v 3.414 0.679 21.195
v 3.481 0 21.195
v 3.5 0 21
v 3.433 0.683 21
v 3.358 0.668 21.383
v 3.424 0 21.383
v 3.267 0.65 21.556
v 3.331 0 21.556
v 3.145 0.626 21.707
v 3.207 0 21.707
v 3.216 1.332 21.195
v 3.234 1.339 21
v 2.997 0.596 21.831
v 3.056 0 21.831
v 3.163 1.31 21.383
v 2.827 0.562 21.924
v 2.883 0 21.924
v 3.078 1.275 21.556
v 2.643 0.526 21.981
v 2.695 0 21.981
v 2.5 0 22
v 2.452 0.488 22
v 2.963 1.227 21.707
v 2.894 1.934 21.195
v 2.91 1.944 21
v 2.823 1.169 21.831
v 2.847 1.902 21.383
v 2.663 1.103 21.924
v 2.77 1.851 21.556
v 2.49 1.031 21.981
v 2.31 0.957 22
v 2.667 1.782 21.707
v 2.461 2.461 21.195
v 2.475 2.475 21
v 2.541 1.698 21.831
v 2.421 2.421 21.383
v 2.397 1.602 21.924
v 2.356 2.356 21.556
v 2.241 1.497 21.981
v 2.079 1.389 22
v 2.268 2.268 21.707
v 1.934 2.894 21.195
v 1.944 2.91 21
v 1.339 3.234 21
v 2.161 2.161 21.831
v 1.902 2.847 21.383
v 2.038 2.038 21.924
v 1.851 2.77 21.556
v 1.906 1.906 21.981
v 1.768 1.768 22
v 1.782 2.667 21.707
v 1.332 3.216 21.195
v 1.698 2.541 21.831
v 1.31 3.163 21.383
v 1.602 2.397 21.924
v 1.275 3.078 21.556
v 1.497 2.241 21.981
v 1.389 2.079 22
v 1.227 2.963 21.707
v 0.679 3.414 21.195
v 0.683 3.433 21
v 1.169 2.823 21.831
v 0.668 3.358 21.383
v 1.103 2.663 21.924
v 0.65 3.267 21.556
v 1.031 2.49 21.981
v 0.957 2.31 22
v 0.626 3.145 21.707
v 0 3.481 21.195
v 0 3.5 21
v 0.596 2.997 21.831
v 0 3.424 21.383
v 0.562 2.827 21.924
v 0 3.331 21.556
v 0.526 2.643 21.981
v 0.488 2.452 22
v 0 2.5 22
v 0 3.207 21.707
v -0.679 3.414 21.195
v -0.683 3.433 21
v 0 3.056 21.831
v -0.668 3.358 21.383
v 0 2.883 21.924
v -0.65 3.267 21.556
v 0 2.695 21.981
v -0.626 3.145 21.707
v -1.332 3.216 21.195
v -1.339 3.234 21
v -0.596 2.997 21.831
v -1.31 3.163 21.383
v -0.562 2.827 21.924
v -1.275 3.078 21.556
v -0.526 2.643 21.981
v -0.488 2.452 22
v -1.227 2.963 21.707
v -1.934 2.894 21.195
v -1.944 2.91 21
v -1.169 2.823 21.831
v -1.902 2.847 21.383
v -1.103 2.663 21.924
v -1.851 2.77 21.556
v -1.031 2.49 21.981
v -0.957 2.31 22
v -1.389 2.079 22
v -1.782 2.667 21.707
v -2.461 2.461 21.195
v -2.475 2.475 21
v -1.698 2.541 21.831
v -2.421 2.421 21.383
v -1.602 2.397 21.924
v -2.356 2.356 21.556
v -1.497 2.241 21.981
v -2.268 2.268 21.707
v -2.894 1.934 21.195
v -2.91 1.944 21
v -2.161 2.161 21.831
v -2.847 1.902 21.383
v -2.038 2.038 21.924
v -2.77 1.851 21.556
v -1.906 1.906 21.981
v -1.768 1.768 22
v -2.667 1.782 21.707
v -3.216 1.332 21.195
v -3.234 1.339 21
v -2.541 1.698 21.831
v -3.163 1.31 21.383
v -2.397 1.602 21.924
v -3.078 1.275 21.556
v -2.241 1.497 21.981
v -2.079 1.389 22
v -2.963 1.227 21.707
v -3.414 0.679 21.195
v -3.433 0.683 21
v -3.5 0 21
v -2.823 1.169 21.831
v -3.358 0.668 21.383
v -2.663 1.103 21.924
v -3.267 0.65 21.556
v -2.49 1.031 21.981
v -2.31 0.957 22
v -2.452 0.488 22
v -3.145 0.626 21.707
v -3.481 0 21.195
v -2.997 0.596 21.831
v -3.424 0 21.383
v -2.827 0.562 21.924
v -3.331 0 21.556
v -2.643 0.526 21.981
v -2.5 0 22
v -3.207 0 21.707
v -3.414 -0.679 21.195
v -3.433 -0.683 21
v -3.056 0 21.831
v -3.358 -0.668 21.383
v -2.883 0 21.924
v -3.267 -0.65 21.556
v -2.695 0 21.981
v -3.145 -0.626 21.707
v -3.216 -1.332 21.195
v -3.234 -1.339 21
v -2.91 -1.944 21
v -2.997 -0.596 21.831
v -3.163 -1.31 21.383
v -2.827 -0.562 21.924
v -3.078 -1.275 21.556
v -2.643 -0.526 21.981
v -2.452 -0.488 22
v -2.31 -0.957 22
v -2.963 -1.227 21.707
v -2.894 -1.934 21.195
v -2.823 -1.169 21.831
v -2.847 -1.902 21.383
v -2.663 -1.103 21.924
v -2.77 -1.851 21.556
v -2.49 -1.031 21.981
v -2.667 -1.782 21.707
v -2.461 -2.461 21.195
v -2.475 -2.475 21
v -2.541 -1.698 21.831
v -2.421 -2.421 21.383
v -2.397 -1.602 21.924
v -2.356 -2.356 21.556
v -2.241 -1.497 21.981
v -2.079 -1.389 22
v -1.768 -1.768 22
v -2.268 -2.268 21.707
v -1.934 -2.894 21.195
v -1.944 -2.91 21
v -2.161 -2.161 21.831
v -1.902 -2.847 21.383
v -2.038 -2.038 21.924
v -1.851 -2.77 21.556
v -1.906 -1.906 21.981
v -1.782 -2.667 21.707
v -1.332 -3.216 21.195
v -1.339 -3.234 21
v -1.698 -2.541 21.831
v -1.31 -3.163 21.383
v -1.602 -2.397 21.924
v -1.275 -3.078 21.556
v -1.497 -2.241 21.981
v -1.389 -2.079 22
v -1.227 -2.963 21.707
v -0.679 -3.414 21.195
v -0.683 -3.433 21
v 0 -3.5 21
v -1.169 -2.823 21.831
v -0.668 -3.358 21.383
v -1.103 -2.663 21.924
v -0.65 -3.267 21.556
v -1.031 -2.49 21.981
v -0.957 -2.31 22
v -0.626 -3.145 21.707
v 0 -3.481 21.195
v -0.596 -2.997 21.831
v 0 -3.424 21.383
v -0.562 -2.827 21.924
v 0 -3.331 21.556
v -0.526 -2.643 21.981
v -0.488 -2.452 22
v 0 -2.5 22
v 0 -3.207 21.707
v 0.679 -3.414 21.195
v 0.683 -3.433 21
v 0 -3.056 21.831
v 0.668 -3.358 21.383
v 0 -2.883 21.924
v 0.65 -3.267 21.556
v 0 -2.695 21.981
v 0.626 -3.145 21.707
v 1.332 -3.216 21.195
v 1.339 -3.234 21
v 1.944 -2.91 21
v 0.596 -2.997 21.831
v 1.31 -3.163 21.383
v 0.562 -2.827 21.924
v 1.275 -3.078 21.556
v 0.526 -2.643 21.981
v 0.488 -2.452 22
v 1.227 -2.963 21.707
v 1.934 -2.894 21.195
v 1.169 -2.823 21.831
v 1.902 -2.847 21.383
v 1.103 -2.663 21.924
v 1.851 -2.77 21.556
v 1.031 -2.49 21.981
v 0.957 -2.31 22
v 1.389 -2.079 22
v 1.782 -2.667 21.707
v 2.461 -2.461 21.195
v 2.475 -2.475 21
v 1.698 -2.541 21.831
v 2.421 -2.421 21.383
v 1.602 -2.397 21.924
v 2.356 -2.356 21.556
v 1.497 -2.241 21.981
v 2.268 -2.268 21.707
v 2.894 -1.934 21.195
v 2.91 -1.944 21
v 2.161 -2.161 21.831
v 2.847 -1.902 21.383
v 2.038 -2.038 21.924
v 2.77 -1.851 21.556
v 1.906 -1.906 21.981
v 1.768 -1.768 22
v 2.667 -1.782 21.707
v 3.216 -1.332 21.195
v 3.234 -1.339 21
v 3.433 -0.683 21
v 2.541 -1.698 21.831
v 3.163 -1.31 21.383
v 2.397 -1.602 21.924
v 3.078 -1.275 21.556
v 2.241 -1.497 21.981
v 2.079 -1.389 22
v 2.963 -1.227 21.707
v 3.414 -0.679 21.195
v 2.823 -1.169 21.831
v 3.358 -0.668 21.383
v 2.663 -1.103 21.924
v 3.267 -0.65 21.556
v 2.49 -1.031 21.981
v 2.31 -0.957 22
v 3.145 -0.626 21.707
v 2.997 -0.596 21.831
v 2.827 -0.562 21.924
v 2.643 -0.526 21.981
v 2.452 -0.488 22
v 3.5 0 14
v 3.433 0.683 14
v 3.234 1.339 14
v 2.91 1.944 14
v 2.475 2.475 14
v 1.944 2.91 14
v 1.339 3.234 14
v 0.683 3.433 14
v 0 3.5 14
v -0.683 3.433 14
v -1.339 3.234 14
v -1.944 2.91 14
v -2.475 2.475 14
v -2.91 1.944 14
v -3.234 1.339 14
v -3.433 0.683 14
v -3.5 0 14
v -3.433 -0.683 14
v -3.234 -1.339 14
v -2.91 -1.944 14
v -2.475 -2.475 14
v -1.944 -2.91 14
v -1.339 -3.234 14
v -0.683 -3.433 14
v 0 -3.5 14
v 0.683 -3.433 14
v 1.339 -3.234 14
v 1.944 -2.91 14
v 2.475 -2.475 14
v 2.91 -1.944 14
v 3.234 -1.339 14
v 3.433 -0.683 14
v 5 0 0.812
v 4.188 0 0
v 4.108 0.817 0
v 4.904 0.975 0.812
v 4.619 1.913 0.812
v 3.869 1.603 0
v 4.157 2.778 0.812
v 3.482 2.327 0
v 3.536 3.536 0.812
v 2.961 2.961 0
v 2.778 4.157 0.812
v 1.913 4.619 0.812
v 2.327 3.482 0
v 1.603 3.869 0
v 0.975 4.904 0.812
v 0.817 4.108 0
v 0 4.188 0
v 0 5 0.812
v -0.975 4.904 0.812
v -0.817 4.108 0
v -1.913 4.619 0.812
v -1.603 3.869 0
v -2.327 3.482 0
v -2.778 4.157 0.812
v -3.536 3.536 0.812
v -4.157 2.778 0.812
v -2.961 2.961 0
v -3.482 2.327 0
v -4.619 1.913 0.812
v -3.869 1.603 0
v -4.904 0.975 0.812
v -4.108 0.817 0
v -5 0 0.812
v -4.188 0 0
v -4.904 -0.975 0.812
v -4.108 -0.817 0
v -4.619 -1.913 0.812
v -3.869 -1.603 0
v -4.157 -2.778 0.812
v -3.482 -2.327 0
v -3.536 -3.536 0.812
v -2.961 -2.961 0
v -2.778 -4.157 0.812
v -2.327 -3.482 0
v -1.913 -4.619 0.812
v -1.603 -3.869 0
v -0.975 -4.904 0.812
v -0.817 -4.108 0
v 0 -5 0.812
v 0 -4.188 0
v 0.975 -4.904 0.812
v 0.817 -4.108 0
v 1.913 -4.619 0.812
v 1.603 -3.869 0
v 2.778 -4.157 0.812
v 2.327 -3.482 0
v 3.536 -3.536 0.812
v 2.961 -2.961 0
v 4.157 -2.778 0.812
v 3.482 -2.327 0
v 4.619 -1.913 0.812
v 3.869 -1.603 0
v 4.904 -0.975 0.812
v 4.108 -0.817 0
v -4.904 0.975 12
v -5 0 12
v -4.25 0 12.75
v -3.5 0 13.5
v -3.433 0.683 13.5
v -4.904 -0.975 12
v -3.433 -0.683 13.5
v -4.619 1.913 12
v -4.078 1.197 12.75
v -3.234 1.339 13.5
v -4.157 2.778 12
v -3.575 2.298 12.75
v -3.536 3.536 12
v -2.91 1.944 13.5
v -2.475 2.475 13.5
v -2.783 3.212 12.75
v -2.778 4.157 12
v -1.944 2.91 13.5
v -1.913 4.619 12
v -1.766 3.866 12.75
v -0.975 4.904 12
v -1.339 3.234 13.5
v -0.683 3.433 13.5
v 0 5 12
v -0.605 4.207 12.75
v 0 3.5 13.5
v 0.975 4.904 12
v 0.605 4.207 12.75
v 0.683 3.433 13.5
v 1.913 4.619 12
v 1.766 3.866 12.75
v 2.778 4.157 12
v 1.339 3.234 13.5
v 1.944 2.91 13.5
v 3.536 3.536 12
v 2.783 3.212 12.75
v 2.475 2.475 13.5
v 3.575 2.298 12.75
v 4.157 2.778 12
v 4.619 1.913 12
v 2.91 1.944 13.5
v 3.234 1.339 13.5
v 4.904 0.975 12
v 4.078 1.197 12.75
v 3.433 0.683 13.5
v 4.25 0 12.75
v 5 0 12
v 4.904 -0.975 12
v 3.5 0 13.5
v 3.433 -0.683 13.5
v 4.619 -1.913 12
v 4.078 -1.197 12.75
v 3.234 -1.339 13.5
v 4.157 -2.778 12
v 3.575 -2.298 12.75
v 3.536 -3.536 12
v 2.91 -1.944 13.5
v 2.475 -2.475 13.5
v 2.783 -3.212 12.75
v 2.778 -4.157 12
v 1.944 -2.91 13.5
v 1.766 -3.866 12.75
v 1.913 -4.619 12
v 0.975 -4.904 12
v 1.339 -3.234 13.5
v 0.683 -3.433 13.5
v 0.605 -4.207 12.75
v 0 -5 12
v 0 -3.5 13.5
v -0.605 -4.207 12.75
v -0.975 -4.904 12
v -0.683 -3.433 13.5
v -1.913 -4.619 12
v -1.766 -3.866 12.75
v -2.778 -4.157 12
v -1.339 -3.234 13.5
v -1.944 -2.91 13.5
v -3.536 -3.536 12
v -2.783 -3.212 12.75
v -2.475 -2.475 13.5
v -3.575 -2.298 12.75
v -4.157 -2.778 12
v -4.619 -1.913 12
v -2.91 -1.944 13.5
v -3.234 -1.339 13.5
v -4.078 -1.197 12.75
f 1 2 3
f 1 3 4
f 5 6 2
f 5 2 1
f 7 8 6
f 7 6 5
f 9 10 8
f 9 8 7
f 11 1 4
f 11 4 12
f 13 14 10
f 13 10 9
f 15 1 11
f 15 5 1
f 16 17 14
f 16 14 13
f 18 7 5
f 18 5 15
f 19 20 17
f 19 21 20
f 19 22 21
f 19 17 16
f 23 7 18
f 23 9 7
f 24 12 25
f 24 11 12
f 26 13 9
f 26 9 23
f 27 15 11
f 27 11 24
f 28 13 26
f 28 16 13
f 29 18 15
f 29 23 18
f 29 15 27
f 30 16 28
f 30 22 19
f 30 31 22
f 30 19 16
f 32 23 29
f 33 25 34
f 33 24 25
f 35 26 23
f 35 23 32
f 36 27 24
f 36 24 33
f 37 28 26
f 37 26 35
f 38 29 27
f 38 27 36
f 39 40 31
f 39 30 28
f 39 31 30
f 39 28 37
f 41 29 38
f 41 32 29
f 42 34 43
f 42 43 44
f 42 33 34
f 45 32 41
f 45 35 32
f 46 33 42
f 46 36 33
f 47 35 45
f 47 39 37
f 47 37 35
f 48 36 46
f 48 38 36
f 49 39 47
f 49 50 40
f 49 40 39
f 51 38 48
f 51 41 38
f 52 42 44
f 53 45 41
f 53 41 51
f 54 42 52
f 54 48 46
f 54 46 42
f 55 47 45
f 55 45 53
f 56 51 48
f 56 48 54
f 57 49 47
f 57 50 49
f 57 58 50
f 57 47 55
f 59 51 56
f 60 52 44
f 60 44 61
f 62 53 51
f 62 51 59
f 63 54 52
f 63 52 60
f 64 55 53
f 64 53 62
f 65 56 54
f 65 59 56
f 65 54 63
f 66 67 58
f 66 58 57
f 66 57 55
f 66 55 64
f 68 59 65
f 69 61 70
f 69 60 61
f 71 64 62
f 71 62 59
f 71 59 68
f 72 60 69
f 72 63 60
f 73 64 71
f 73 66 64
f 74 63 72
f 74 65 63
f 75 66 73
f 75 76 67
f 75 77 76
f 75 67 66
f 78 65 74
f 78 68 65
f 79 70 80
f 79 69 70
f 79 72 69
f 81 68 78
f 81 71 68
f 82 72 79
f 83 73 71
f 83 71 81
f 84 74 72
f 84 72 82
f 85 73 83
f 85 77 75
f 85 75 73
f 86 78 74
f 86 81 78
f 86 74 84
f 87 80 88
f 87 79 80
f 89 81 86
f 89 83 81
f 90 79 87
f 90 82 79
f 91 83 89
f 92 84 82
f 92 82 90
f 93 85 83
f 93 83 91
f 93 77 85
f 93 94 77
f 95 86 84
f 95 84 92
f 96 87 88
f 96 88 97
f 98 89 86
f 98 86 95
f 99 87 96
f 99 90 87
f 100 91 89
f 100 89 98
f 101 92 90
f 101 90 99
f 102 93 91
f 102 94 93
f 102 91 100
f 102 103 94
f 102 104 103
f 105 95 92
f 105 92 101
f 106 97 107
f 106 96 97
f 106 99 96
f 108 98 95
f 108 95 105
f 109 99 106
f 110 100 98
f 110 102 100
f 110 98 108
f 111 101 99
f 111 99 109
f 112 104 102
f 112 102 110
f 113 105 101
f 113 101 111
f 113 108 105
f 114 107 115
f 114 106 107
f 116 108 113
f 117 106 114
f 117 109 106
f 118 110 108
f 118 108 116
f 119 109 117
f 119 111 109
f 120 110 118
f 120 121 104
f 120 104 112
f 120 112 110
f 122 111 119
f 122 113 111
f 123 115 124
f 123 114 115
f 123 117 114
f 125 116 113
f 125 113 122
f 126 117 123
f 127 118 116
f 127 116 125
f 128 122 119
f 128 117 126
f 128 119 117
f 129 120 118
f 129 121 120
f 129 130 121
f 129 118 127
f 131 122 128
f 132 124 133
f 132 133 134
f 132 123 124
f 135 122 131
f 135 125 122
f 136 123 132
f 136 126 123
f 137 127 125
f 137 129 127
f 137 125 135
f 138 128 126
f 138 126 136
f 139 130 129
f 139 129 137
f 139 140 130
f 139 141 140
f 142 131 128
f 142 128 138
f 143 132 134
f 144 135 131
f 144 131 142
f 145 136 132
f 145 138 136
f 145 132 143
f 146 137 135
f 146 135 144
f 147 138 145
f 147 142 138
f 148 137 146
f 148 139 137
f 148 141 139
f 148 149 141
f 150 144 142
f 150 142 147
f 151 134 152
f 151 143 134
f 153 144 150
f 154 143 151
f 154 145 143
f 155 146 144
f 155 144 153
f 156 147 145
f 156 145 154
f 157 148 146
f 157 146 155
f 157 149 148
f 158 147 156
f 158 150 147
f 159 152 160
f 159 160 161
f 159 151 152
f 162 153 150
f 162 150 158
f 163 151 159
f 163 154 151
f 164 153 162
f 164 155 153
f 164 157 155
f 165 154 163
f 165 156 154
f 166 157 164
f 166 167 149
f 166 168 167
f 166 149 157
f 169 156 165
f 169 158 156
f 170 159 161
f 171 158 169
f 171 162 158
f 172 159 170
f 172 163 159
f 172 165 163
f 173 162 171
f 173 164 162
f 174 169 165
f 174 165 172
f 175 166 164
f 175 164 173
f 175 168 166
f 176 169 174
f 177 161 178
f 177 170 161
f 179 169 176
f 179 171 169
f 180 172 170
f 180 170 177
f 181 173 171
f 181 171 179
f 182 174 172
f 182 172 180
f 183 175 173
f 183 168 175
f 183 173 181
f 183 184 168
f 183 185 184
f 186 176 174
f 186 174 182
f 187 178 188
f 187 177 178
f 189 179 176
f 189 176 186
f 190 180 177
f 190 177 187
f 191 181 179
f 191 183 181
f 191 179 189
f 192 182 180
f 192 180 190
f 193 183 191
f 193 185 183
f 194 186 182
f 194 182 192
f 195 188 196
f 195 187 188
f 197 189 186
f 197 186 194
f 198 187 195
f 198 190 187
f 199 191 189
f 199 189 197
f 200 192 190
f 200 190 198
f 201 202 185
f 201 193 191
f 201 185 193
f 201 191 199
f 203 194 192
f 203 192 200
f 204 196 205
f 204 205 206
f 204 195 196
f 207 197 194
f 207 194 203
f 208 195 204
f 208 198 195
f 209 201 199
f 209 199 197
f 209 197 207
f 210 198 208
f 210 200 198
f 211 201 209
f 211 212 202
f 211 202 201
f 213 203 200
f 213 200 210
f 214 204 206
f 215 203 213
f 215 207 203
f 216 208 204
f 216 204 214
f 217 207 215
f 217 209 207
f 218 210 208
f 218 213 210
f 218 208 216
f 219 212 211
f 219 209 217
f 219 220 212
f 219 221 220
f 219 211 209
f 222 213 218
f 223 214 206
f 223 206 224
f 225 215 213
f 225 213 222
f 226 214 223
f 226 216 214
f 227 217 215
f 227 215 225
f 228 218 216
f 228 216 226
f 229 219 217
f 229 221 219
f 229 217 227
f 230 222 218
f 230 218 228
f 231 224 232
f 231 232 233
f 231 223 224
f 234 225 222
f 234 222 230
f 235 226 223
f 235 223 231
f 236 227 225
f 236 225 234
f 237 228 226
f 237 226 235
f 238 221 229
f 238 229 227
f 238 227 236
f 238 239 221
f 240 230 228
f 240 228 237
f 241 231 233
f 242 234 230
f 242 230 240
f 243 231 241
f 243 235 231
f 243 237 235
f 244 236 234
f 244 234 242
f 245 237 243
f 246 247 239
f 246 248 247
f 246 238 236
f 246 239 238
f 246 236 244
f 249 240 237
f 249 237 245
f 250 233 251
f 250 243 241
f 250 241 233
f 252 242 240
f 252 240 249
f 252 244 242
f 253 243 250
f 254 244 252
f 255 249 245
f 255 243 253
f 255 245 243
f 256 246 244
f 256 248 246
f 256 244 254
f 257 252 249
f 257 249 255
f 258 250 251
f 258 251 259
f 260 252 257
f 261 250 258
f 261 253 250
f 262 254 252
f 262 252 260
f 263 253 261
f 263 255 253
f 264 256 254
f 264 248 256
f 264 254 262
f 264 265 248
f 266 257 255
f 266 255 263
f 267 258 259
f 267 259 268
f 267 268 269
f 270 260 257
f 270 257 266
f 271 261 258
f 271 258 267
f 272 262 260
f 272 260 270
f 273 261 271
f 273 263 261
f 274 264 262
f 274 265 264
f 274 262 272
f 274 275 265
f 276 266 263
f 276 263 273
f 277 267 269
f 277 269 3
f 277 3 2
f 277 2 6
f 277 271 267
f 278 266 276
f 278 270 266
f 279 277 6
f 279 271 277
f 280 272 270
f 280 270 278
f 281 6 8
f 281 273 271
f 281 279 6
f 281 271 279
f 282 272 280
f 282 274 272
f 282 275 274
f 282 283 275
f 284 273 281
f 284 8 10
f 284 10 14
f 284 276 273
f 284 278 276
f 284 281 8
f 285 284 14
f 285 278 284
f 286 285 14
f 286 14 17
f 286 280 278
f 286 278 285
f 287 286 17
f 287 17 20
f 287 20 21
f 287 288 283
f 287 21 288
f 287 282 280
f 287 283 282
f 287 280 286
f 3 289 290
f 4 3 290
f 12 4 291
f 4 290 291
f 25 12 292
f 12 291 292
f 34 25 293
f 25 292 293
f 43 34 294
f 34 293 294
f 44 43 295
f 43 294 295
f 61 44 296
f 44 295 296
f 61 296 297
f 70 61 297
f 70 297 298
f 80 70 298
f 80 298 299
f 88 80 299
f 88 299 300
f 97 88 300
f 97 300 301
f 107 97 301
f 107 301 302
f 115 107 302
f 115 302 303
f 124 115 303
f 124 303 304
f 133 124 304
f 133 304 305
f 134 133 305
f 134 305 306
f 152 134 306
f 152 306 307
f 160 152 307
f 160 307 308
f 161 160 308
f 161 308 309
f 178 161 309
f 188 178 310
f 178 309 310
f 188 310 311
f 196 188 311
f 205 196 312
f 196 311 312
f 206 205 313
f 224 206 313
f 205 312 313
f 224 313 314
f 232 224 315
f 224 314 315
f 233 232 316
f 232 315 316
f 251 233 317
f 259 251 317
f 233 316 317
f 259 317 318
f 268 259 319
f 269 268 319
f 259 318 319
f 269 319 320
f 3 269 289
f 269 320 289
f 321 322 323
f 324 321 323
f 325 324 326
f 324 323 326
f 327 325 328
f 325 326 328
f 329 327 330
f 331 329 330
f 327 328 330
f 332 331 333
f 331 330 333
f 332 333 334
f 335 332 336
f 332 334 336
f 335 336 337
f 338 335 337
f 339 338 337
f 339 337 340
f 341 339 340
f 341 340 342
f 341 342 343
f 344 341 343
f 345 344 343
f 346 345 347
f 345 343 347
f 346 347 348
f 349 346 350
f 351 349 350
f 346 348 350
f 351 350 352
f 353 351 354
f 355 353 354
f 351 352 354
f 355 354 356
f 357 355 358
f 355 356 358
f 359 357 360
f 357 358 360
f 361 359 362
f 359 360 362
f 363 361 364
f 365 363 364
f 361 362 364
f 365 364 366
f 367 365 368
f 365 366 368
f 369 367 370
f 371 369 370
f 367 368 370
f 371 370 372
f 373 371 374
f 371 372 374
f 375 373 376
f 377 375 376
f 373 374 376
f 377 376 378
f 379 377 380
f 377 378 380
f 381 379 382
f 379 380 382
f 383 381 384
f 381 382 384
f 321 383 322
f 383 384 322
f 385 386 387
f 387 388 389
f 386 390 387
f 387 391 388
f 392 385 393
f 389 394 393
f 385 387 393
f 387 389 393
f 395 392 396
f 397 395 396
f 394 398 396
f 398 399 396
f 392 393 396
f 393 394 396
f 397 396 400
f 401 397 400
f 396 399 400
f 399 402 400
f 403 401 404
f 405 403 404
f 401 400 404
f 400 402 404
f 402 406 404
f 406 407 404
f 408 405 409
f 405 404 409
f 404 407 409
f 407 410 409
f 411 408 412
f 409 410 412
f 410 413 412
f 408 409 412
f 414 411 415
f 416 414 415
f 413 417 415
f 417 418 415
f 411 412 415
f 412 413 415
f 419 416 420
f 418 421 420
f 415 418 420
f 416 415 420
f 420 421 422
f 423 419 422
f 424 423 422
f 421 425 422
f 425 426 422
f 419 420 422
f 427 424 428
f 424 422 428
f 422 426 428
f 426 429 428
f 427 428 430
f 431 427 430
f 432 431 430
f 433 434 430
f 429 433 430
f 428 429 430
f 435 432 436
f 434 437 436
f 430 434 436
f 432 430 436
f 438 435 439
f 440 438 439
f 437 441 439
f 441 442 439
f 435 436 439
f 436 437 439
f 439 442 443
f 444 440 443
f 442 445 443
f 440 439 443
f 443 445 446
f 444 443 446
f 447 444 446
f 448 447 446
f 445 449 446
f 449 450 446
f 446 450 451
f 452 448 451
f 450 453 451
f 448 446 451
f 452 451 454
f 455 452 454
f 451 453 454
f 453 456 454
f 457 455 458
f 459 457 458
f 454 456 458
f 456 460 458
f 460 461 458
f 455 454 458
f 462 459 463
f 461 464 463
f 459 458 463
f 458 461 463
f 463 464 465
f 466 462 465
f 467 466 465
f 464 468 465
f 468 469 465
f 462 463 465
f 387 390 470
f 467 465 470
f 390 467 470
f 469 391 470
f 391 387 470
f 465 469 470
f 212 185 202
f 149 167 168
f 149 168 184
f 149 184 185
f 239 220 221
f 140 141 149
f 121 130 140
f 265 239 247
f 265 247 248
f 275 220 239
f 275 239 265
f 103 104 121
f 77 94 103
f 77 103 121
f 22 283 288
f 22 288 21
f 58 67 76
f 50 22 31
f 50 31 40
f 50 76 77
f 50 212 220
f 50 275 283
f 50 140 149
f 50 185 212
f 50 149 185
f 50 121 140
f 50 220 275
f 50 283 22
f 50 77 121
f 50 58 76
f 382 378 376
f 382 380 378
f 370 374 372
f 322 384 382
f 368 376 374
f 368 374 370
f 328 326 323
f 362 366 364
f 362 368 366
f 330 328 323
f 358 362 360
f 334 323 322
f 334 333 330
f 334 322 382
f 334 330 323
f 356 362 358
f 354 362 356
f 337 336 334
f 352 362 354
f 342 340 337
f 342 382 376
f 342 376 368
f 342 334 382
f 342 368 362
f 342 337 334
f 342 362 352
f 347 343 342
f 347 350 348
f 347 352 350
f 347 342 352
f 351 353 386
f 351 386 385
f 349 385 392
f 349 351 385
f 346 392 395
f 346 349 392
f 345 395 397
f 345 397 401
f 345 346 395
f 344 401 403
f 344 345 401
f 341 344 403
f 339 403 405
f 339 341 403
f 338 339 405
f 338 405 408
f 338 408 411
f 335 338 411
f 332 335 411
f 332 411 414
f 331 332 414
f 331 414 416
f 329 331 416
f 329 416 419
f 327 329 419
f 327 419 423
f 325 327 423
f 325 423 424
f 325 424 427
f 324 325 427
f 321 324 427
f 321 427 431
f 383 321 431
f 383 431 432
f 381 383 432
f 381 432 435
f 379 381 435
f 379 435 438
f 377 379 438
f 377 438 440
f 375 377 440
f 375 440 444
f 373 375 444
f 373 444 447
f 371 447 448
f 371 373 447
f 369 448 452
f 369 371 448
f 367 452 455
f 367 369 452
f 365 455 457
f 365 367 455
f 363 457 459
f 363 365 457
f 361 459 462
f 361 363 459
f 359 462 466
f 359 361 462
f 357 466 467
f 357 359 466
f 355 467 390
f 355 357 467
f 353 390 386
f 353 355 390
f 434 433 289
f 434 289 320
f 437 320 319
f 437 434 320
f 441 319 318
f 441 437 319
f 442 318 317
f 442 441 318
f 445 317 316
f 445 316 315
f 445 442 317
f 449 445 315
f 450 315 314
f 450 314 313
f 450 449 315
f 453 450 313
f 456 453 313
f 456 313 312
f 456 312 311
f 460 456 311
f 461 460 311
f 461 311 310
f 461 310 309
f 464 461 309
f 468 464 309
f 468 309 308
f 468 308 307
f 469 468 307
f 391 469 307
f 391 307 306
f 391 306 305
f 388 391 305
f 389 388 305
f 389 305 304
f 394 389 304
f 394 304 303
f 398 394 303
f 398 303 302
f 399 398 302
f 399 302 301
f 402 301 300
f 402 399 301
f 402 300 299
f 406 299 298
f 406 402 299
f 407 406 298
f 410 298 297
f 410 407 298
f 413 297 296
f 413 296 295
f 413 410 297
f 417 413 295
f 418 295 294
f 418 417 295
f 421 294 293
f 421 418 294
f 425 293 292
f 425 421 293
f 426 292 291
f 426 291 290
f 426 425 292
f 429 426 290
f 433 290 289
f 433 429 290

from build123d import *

# Parameters (mm, degrees)
SKETCH_1_R      = 3.5
EXTRUDE_1_DEPTH = 22
FILLET_1_R      = 1
SKETCH_2_R      = 5
EXTRUDE_2_DEPTH = 14
CHAMFER_1_SIZE  = 2


# Read off the part's stored shape, not the designer's step: M10 机械螺纹 螺柱1
with BuildPart() as part:
    # 草图1 → 凸台-拉伸1 (new body)
    with BuildSketch(Plane.XY):
        Circle(SKETCH_1_R)
    extrude(amount=EXTRUDE_1_DEPTH)

    # 圆角1
    fillet_1_edges = [part.edges().sort_by_distance(p)[0] for p in [
        (-3.5, 0, 22),
    ]]
    fillet(fillet_1_edges, radius=FILLET_1_R)

    # 草图2 → 凸台-拉伸2 (add)
    with BuildSketch(Plane(origin=(0, 0, 0), x_dir=(-1, 0, 0), z_dir=(0, 0, -1))):
        Circle(SKETCH_2_R)
    extrude(amount=-EXTRUDE_2_DEPTH)

    # M10 机械螺纹 螺柱1 outline → M10 机械螺纹 螺柱1 (revolve, cut)
    with BuildSketch(Plane.XZ):
        Polygon((5, 0.812), (4.188, 0), (5, 0), align=None)
    revolve(axis=Axis((0, 0, 0), (0, 0, 1)), mode=Mode.SUBTRACT)

    # 倒角1
    # the kernel refuses this chamfer: 2 mm, written as the material it takes off along each edge
    with BuildSketch(Plane(origin=(0, 0, 14), x_dir=(-1, 0, 0), z_dir=(0, -1, 0))) as chamfer_1_piece_1_section:
        Polygon((5, CHAMFER_1_SIZE), (5 - CHAMFER_1_SIZE, 0), (5, 0), align=None)
    chamfer_1_piece_1 = revolve(axis=Axis((0, 0, 14), (0, 0, -1)), mode=Mode.PRIVATE)
    chamfer_1_piece_1 = chamfer_1_piece_1 - Plane(origin=(0, 0, 12.748861674), x_dir=(1, 0, 0), z_dir=(0, 0, -1)) * Cylinder(3.5, 20, mode=Mode.PRIVATE)
    add(chamfer_1_piece_1, mode=Mode.SUBTRACT)


solid = part.part
